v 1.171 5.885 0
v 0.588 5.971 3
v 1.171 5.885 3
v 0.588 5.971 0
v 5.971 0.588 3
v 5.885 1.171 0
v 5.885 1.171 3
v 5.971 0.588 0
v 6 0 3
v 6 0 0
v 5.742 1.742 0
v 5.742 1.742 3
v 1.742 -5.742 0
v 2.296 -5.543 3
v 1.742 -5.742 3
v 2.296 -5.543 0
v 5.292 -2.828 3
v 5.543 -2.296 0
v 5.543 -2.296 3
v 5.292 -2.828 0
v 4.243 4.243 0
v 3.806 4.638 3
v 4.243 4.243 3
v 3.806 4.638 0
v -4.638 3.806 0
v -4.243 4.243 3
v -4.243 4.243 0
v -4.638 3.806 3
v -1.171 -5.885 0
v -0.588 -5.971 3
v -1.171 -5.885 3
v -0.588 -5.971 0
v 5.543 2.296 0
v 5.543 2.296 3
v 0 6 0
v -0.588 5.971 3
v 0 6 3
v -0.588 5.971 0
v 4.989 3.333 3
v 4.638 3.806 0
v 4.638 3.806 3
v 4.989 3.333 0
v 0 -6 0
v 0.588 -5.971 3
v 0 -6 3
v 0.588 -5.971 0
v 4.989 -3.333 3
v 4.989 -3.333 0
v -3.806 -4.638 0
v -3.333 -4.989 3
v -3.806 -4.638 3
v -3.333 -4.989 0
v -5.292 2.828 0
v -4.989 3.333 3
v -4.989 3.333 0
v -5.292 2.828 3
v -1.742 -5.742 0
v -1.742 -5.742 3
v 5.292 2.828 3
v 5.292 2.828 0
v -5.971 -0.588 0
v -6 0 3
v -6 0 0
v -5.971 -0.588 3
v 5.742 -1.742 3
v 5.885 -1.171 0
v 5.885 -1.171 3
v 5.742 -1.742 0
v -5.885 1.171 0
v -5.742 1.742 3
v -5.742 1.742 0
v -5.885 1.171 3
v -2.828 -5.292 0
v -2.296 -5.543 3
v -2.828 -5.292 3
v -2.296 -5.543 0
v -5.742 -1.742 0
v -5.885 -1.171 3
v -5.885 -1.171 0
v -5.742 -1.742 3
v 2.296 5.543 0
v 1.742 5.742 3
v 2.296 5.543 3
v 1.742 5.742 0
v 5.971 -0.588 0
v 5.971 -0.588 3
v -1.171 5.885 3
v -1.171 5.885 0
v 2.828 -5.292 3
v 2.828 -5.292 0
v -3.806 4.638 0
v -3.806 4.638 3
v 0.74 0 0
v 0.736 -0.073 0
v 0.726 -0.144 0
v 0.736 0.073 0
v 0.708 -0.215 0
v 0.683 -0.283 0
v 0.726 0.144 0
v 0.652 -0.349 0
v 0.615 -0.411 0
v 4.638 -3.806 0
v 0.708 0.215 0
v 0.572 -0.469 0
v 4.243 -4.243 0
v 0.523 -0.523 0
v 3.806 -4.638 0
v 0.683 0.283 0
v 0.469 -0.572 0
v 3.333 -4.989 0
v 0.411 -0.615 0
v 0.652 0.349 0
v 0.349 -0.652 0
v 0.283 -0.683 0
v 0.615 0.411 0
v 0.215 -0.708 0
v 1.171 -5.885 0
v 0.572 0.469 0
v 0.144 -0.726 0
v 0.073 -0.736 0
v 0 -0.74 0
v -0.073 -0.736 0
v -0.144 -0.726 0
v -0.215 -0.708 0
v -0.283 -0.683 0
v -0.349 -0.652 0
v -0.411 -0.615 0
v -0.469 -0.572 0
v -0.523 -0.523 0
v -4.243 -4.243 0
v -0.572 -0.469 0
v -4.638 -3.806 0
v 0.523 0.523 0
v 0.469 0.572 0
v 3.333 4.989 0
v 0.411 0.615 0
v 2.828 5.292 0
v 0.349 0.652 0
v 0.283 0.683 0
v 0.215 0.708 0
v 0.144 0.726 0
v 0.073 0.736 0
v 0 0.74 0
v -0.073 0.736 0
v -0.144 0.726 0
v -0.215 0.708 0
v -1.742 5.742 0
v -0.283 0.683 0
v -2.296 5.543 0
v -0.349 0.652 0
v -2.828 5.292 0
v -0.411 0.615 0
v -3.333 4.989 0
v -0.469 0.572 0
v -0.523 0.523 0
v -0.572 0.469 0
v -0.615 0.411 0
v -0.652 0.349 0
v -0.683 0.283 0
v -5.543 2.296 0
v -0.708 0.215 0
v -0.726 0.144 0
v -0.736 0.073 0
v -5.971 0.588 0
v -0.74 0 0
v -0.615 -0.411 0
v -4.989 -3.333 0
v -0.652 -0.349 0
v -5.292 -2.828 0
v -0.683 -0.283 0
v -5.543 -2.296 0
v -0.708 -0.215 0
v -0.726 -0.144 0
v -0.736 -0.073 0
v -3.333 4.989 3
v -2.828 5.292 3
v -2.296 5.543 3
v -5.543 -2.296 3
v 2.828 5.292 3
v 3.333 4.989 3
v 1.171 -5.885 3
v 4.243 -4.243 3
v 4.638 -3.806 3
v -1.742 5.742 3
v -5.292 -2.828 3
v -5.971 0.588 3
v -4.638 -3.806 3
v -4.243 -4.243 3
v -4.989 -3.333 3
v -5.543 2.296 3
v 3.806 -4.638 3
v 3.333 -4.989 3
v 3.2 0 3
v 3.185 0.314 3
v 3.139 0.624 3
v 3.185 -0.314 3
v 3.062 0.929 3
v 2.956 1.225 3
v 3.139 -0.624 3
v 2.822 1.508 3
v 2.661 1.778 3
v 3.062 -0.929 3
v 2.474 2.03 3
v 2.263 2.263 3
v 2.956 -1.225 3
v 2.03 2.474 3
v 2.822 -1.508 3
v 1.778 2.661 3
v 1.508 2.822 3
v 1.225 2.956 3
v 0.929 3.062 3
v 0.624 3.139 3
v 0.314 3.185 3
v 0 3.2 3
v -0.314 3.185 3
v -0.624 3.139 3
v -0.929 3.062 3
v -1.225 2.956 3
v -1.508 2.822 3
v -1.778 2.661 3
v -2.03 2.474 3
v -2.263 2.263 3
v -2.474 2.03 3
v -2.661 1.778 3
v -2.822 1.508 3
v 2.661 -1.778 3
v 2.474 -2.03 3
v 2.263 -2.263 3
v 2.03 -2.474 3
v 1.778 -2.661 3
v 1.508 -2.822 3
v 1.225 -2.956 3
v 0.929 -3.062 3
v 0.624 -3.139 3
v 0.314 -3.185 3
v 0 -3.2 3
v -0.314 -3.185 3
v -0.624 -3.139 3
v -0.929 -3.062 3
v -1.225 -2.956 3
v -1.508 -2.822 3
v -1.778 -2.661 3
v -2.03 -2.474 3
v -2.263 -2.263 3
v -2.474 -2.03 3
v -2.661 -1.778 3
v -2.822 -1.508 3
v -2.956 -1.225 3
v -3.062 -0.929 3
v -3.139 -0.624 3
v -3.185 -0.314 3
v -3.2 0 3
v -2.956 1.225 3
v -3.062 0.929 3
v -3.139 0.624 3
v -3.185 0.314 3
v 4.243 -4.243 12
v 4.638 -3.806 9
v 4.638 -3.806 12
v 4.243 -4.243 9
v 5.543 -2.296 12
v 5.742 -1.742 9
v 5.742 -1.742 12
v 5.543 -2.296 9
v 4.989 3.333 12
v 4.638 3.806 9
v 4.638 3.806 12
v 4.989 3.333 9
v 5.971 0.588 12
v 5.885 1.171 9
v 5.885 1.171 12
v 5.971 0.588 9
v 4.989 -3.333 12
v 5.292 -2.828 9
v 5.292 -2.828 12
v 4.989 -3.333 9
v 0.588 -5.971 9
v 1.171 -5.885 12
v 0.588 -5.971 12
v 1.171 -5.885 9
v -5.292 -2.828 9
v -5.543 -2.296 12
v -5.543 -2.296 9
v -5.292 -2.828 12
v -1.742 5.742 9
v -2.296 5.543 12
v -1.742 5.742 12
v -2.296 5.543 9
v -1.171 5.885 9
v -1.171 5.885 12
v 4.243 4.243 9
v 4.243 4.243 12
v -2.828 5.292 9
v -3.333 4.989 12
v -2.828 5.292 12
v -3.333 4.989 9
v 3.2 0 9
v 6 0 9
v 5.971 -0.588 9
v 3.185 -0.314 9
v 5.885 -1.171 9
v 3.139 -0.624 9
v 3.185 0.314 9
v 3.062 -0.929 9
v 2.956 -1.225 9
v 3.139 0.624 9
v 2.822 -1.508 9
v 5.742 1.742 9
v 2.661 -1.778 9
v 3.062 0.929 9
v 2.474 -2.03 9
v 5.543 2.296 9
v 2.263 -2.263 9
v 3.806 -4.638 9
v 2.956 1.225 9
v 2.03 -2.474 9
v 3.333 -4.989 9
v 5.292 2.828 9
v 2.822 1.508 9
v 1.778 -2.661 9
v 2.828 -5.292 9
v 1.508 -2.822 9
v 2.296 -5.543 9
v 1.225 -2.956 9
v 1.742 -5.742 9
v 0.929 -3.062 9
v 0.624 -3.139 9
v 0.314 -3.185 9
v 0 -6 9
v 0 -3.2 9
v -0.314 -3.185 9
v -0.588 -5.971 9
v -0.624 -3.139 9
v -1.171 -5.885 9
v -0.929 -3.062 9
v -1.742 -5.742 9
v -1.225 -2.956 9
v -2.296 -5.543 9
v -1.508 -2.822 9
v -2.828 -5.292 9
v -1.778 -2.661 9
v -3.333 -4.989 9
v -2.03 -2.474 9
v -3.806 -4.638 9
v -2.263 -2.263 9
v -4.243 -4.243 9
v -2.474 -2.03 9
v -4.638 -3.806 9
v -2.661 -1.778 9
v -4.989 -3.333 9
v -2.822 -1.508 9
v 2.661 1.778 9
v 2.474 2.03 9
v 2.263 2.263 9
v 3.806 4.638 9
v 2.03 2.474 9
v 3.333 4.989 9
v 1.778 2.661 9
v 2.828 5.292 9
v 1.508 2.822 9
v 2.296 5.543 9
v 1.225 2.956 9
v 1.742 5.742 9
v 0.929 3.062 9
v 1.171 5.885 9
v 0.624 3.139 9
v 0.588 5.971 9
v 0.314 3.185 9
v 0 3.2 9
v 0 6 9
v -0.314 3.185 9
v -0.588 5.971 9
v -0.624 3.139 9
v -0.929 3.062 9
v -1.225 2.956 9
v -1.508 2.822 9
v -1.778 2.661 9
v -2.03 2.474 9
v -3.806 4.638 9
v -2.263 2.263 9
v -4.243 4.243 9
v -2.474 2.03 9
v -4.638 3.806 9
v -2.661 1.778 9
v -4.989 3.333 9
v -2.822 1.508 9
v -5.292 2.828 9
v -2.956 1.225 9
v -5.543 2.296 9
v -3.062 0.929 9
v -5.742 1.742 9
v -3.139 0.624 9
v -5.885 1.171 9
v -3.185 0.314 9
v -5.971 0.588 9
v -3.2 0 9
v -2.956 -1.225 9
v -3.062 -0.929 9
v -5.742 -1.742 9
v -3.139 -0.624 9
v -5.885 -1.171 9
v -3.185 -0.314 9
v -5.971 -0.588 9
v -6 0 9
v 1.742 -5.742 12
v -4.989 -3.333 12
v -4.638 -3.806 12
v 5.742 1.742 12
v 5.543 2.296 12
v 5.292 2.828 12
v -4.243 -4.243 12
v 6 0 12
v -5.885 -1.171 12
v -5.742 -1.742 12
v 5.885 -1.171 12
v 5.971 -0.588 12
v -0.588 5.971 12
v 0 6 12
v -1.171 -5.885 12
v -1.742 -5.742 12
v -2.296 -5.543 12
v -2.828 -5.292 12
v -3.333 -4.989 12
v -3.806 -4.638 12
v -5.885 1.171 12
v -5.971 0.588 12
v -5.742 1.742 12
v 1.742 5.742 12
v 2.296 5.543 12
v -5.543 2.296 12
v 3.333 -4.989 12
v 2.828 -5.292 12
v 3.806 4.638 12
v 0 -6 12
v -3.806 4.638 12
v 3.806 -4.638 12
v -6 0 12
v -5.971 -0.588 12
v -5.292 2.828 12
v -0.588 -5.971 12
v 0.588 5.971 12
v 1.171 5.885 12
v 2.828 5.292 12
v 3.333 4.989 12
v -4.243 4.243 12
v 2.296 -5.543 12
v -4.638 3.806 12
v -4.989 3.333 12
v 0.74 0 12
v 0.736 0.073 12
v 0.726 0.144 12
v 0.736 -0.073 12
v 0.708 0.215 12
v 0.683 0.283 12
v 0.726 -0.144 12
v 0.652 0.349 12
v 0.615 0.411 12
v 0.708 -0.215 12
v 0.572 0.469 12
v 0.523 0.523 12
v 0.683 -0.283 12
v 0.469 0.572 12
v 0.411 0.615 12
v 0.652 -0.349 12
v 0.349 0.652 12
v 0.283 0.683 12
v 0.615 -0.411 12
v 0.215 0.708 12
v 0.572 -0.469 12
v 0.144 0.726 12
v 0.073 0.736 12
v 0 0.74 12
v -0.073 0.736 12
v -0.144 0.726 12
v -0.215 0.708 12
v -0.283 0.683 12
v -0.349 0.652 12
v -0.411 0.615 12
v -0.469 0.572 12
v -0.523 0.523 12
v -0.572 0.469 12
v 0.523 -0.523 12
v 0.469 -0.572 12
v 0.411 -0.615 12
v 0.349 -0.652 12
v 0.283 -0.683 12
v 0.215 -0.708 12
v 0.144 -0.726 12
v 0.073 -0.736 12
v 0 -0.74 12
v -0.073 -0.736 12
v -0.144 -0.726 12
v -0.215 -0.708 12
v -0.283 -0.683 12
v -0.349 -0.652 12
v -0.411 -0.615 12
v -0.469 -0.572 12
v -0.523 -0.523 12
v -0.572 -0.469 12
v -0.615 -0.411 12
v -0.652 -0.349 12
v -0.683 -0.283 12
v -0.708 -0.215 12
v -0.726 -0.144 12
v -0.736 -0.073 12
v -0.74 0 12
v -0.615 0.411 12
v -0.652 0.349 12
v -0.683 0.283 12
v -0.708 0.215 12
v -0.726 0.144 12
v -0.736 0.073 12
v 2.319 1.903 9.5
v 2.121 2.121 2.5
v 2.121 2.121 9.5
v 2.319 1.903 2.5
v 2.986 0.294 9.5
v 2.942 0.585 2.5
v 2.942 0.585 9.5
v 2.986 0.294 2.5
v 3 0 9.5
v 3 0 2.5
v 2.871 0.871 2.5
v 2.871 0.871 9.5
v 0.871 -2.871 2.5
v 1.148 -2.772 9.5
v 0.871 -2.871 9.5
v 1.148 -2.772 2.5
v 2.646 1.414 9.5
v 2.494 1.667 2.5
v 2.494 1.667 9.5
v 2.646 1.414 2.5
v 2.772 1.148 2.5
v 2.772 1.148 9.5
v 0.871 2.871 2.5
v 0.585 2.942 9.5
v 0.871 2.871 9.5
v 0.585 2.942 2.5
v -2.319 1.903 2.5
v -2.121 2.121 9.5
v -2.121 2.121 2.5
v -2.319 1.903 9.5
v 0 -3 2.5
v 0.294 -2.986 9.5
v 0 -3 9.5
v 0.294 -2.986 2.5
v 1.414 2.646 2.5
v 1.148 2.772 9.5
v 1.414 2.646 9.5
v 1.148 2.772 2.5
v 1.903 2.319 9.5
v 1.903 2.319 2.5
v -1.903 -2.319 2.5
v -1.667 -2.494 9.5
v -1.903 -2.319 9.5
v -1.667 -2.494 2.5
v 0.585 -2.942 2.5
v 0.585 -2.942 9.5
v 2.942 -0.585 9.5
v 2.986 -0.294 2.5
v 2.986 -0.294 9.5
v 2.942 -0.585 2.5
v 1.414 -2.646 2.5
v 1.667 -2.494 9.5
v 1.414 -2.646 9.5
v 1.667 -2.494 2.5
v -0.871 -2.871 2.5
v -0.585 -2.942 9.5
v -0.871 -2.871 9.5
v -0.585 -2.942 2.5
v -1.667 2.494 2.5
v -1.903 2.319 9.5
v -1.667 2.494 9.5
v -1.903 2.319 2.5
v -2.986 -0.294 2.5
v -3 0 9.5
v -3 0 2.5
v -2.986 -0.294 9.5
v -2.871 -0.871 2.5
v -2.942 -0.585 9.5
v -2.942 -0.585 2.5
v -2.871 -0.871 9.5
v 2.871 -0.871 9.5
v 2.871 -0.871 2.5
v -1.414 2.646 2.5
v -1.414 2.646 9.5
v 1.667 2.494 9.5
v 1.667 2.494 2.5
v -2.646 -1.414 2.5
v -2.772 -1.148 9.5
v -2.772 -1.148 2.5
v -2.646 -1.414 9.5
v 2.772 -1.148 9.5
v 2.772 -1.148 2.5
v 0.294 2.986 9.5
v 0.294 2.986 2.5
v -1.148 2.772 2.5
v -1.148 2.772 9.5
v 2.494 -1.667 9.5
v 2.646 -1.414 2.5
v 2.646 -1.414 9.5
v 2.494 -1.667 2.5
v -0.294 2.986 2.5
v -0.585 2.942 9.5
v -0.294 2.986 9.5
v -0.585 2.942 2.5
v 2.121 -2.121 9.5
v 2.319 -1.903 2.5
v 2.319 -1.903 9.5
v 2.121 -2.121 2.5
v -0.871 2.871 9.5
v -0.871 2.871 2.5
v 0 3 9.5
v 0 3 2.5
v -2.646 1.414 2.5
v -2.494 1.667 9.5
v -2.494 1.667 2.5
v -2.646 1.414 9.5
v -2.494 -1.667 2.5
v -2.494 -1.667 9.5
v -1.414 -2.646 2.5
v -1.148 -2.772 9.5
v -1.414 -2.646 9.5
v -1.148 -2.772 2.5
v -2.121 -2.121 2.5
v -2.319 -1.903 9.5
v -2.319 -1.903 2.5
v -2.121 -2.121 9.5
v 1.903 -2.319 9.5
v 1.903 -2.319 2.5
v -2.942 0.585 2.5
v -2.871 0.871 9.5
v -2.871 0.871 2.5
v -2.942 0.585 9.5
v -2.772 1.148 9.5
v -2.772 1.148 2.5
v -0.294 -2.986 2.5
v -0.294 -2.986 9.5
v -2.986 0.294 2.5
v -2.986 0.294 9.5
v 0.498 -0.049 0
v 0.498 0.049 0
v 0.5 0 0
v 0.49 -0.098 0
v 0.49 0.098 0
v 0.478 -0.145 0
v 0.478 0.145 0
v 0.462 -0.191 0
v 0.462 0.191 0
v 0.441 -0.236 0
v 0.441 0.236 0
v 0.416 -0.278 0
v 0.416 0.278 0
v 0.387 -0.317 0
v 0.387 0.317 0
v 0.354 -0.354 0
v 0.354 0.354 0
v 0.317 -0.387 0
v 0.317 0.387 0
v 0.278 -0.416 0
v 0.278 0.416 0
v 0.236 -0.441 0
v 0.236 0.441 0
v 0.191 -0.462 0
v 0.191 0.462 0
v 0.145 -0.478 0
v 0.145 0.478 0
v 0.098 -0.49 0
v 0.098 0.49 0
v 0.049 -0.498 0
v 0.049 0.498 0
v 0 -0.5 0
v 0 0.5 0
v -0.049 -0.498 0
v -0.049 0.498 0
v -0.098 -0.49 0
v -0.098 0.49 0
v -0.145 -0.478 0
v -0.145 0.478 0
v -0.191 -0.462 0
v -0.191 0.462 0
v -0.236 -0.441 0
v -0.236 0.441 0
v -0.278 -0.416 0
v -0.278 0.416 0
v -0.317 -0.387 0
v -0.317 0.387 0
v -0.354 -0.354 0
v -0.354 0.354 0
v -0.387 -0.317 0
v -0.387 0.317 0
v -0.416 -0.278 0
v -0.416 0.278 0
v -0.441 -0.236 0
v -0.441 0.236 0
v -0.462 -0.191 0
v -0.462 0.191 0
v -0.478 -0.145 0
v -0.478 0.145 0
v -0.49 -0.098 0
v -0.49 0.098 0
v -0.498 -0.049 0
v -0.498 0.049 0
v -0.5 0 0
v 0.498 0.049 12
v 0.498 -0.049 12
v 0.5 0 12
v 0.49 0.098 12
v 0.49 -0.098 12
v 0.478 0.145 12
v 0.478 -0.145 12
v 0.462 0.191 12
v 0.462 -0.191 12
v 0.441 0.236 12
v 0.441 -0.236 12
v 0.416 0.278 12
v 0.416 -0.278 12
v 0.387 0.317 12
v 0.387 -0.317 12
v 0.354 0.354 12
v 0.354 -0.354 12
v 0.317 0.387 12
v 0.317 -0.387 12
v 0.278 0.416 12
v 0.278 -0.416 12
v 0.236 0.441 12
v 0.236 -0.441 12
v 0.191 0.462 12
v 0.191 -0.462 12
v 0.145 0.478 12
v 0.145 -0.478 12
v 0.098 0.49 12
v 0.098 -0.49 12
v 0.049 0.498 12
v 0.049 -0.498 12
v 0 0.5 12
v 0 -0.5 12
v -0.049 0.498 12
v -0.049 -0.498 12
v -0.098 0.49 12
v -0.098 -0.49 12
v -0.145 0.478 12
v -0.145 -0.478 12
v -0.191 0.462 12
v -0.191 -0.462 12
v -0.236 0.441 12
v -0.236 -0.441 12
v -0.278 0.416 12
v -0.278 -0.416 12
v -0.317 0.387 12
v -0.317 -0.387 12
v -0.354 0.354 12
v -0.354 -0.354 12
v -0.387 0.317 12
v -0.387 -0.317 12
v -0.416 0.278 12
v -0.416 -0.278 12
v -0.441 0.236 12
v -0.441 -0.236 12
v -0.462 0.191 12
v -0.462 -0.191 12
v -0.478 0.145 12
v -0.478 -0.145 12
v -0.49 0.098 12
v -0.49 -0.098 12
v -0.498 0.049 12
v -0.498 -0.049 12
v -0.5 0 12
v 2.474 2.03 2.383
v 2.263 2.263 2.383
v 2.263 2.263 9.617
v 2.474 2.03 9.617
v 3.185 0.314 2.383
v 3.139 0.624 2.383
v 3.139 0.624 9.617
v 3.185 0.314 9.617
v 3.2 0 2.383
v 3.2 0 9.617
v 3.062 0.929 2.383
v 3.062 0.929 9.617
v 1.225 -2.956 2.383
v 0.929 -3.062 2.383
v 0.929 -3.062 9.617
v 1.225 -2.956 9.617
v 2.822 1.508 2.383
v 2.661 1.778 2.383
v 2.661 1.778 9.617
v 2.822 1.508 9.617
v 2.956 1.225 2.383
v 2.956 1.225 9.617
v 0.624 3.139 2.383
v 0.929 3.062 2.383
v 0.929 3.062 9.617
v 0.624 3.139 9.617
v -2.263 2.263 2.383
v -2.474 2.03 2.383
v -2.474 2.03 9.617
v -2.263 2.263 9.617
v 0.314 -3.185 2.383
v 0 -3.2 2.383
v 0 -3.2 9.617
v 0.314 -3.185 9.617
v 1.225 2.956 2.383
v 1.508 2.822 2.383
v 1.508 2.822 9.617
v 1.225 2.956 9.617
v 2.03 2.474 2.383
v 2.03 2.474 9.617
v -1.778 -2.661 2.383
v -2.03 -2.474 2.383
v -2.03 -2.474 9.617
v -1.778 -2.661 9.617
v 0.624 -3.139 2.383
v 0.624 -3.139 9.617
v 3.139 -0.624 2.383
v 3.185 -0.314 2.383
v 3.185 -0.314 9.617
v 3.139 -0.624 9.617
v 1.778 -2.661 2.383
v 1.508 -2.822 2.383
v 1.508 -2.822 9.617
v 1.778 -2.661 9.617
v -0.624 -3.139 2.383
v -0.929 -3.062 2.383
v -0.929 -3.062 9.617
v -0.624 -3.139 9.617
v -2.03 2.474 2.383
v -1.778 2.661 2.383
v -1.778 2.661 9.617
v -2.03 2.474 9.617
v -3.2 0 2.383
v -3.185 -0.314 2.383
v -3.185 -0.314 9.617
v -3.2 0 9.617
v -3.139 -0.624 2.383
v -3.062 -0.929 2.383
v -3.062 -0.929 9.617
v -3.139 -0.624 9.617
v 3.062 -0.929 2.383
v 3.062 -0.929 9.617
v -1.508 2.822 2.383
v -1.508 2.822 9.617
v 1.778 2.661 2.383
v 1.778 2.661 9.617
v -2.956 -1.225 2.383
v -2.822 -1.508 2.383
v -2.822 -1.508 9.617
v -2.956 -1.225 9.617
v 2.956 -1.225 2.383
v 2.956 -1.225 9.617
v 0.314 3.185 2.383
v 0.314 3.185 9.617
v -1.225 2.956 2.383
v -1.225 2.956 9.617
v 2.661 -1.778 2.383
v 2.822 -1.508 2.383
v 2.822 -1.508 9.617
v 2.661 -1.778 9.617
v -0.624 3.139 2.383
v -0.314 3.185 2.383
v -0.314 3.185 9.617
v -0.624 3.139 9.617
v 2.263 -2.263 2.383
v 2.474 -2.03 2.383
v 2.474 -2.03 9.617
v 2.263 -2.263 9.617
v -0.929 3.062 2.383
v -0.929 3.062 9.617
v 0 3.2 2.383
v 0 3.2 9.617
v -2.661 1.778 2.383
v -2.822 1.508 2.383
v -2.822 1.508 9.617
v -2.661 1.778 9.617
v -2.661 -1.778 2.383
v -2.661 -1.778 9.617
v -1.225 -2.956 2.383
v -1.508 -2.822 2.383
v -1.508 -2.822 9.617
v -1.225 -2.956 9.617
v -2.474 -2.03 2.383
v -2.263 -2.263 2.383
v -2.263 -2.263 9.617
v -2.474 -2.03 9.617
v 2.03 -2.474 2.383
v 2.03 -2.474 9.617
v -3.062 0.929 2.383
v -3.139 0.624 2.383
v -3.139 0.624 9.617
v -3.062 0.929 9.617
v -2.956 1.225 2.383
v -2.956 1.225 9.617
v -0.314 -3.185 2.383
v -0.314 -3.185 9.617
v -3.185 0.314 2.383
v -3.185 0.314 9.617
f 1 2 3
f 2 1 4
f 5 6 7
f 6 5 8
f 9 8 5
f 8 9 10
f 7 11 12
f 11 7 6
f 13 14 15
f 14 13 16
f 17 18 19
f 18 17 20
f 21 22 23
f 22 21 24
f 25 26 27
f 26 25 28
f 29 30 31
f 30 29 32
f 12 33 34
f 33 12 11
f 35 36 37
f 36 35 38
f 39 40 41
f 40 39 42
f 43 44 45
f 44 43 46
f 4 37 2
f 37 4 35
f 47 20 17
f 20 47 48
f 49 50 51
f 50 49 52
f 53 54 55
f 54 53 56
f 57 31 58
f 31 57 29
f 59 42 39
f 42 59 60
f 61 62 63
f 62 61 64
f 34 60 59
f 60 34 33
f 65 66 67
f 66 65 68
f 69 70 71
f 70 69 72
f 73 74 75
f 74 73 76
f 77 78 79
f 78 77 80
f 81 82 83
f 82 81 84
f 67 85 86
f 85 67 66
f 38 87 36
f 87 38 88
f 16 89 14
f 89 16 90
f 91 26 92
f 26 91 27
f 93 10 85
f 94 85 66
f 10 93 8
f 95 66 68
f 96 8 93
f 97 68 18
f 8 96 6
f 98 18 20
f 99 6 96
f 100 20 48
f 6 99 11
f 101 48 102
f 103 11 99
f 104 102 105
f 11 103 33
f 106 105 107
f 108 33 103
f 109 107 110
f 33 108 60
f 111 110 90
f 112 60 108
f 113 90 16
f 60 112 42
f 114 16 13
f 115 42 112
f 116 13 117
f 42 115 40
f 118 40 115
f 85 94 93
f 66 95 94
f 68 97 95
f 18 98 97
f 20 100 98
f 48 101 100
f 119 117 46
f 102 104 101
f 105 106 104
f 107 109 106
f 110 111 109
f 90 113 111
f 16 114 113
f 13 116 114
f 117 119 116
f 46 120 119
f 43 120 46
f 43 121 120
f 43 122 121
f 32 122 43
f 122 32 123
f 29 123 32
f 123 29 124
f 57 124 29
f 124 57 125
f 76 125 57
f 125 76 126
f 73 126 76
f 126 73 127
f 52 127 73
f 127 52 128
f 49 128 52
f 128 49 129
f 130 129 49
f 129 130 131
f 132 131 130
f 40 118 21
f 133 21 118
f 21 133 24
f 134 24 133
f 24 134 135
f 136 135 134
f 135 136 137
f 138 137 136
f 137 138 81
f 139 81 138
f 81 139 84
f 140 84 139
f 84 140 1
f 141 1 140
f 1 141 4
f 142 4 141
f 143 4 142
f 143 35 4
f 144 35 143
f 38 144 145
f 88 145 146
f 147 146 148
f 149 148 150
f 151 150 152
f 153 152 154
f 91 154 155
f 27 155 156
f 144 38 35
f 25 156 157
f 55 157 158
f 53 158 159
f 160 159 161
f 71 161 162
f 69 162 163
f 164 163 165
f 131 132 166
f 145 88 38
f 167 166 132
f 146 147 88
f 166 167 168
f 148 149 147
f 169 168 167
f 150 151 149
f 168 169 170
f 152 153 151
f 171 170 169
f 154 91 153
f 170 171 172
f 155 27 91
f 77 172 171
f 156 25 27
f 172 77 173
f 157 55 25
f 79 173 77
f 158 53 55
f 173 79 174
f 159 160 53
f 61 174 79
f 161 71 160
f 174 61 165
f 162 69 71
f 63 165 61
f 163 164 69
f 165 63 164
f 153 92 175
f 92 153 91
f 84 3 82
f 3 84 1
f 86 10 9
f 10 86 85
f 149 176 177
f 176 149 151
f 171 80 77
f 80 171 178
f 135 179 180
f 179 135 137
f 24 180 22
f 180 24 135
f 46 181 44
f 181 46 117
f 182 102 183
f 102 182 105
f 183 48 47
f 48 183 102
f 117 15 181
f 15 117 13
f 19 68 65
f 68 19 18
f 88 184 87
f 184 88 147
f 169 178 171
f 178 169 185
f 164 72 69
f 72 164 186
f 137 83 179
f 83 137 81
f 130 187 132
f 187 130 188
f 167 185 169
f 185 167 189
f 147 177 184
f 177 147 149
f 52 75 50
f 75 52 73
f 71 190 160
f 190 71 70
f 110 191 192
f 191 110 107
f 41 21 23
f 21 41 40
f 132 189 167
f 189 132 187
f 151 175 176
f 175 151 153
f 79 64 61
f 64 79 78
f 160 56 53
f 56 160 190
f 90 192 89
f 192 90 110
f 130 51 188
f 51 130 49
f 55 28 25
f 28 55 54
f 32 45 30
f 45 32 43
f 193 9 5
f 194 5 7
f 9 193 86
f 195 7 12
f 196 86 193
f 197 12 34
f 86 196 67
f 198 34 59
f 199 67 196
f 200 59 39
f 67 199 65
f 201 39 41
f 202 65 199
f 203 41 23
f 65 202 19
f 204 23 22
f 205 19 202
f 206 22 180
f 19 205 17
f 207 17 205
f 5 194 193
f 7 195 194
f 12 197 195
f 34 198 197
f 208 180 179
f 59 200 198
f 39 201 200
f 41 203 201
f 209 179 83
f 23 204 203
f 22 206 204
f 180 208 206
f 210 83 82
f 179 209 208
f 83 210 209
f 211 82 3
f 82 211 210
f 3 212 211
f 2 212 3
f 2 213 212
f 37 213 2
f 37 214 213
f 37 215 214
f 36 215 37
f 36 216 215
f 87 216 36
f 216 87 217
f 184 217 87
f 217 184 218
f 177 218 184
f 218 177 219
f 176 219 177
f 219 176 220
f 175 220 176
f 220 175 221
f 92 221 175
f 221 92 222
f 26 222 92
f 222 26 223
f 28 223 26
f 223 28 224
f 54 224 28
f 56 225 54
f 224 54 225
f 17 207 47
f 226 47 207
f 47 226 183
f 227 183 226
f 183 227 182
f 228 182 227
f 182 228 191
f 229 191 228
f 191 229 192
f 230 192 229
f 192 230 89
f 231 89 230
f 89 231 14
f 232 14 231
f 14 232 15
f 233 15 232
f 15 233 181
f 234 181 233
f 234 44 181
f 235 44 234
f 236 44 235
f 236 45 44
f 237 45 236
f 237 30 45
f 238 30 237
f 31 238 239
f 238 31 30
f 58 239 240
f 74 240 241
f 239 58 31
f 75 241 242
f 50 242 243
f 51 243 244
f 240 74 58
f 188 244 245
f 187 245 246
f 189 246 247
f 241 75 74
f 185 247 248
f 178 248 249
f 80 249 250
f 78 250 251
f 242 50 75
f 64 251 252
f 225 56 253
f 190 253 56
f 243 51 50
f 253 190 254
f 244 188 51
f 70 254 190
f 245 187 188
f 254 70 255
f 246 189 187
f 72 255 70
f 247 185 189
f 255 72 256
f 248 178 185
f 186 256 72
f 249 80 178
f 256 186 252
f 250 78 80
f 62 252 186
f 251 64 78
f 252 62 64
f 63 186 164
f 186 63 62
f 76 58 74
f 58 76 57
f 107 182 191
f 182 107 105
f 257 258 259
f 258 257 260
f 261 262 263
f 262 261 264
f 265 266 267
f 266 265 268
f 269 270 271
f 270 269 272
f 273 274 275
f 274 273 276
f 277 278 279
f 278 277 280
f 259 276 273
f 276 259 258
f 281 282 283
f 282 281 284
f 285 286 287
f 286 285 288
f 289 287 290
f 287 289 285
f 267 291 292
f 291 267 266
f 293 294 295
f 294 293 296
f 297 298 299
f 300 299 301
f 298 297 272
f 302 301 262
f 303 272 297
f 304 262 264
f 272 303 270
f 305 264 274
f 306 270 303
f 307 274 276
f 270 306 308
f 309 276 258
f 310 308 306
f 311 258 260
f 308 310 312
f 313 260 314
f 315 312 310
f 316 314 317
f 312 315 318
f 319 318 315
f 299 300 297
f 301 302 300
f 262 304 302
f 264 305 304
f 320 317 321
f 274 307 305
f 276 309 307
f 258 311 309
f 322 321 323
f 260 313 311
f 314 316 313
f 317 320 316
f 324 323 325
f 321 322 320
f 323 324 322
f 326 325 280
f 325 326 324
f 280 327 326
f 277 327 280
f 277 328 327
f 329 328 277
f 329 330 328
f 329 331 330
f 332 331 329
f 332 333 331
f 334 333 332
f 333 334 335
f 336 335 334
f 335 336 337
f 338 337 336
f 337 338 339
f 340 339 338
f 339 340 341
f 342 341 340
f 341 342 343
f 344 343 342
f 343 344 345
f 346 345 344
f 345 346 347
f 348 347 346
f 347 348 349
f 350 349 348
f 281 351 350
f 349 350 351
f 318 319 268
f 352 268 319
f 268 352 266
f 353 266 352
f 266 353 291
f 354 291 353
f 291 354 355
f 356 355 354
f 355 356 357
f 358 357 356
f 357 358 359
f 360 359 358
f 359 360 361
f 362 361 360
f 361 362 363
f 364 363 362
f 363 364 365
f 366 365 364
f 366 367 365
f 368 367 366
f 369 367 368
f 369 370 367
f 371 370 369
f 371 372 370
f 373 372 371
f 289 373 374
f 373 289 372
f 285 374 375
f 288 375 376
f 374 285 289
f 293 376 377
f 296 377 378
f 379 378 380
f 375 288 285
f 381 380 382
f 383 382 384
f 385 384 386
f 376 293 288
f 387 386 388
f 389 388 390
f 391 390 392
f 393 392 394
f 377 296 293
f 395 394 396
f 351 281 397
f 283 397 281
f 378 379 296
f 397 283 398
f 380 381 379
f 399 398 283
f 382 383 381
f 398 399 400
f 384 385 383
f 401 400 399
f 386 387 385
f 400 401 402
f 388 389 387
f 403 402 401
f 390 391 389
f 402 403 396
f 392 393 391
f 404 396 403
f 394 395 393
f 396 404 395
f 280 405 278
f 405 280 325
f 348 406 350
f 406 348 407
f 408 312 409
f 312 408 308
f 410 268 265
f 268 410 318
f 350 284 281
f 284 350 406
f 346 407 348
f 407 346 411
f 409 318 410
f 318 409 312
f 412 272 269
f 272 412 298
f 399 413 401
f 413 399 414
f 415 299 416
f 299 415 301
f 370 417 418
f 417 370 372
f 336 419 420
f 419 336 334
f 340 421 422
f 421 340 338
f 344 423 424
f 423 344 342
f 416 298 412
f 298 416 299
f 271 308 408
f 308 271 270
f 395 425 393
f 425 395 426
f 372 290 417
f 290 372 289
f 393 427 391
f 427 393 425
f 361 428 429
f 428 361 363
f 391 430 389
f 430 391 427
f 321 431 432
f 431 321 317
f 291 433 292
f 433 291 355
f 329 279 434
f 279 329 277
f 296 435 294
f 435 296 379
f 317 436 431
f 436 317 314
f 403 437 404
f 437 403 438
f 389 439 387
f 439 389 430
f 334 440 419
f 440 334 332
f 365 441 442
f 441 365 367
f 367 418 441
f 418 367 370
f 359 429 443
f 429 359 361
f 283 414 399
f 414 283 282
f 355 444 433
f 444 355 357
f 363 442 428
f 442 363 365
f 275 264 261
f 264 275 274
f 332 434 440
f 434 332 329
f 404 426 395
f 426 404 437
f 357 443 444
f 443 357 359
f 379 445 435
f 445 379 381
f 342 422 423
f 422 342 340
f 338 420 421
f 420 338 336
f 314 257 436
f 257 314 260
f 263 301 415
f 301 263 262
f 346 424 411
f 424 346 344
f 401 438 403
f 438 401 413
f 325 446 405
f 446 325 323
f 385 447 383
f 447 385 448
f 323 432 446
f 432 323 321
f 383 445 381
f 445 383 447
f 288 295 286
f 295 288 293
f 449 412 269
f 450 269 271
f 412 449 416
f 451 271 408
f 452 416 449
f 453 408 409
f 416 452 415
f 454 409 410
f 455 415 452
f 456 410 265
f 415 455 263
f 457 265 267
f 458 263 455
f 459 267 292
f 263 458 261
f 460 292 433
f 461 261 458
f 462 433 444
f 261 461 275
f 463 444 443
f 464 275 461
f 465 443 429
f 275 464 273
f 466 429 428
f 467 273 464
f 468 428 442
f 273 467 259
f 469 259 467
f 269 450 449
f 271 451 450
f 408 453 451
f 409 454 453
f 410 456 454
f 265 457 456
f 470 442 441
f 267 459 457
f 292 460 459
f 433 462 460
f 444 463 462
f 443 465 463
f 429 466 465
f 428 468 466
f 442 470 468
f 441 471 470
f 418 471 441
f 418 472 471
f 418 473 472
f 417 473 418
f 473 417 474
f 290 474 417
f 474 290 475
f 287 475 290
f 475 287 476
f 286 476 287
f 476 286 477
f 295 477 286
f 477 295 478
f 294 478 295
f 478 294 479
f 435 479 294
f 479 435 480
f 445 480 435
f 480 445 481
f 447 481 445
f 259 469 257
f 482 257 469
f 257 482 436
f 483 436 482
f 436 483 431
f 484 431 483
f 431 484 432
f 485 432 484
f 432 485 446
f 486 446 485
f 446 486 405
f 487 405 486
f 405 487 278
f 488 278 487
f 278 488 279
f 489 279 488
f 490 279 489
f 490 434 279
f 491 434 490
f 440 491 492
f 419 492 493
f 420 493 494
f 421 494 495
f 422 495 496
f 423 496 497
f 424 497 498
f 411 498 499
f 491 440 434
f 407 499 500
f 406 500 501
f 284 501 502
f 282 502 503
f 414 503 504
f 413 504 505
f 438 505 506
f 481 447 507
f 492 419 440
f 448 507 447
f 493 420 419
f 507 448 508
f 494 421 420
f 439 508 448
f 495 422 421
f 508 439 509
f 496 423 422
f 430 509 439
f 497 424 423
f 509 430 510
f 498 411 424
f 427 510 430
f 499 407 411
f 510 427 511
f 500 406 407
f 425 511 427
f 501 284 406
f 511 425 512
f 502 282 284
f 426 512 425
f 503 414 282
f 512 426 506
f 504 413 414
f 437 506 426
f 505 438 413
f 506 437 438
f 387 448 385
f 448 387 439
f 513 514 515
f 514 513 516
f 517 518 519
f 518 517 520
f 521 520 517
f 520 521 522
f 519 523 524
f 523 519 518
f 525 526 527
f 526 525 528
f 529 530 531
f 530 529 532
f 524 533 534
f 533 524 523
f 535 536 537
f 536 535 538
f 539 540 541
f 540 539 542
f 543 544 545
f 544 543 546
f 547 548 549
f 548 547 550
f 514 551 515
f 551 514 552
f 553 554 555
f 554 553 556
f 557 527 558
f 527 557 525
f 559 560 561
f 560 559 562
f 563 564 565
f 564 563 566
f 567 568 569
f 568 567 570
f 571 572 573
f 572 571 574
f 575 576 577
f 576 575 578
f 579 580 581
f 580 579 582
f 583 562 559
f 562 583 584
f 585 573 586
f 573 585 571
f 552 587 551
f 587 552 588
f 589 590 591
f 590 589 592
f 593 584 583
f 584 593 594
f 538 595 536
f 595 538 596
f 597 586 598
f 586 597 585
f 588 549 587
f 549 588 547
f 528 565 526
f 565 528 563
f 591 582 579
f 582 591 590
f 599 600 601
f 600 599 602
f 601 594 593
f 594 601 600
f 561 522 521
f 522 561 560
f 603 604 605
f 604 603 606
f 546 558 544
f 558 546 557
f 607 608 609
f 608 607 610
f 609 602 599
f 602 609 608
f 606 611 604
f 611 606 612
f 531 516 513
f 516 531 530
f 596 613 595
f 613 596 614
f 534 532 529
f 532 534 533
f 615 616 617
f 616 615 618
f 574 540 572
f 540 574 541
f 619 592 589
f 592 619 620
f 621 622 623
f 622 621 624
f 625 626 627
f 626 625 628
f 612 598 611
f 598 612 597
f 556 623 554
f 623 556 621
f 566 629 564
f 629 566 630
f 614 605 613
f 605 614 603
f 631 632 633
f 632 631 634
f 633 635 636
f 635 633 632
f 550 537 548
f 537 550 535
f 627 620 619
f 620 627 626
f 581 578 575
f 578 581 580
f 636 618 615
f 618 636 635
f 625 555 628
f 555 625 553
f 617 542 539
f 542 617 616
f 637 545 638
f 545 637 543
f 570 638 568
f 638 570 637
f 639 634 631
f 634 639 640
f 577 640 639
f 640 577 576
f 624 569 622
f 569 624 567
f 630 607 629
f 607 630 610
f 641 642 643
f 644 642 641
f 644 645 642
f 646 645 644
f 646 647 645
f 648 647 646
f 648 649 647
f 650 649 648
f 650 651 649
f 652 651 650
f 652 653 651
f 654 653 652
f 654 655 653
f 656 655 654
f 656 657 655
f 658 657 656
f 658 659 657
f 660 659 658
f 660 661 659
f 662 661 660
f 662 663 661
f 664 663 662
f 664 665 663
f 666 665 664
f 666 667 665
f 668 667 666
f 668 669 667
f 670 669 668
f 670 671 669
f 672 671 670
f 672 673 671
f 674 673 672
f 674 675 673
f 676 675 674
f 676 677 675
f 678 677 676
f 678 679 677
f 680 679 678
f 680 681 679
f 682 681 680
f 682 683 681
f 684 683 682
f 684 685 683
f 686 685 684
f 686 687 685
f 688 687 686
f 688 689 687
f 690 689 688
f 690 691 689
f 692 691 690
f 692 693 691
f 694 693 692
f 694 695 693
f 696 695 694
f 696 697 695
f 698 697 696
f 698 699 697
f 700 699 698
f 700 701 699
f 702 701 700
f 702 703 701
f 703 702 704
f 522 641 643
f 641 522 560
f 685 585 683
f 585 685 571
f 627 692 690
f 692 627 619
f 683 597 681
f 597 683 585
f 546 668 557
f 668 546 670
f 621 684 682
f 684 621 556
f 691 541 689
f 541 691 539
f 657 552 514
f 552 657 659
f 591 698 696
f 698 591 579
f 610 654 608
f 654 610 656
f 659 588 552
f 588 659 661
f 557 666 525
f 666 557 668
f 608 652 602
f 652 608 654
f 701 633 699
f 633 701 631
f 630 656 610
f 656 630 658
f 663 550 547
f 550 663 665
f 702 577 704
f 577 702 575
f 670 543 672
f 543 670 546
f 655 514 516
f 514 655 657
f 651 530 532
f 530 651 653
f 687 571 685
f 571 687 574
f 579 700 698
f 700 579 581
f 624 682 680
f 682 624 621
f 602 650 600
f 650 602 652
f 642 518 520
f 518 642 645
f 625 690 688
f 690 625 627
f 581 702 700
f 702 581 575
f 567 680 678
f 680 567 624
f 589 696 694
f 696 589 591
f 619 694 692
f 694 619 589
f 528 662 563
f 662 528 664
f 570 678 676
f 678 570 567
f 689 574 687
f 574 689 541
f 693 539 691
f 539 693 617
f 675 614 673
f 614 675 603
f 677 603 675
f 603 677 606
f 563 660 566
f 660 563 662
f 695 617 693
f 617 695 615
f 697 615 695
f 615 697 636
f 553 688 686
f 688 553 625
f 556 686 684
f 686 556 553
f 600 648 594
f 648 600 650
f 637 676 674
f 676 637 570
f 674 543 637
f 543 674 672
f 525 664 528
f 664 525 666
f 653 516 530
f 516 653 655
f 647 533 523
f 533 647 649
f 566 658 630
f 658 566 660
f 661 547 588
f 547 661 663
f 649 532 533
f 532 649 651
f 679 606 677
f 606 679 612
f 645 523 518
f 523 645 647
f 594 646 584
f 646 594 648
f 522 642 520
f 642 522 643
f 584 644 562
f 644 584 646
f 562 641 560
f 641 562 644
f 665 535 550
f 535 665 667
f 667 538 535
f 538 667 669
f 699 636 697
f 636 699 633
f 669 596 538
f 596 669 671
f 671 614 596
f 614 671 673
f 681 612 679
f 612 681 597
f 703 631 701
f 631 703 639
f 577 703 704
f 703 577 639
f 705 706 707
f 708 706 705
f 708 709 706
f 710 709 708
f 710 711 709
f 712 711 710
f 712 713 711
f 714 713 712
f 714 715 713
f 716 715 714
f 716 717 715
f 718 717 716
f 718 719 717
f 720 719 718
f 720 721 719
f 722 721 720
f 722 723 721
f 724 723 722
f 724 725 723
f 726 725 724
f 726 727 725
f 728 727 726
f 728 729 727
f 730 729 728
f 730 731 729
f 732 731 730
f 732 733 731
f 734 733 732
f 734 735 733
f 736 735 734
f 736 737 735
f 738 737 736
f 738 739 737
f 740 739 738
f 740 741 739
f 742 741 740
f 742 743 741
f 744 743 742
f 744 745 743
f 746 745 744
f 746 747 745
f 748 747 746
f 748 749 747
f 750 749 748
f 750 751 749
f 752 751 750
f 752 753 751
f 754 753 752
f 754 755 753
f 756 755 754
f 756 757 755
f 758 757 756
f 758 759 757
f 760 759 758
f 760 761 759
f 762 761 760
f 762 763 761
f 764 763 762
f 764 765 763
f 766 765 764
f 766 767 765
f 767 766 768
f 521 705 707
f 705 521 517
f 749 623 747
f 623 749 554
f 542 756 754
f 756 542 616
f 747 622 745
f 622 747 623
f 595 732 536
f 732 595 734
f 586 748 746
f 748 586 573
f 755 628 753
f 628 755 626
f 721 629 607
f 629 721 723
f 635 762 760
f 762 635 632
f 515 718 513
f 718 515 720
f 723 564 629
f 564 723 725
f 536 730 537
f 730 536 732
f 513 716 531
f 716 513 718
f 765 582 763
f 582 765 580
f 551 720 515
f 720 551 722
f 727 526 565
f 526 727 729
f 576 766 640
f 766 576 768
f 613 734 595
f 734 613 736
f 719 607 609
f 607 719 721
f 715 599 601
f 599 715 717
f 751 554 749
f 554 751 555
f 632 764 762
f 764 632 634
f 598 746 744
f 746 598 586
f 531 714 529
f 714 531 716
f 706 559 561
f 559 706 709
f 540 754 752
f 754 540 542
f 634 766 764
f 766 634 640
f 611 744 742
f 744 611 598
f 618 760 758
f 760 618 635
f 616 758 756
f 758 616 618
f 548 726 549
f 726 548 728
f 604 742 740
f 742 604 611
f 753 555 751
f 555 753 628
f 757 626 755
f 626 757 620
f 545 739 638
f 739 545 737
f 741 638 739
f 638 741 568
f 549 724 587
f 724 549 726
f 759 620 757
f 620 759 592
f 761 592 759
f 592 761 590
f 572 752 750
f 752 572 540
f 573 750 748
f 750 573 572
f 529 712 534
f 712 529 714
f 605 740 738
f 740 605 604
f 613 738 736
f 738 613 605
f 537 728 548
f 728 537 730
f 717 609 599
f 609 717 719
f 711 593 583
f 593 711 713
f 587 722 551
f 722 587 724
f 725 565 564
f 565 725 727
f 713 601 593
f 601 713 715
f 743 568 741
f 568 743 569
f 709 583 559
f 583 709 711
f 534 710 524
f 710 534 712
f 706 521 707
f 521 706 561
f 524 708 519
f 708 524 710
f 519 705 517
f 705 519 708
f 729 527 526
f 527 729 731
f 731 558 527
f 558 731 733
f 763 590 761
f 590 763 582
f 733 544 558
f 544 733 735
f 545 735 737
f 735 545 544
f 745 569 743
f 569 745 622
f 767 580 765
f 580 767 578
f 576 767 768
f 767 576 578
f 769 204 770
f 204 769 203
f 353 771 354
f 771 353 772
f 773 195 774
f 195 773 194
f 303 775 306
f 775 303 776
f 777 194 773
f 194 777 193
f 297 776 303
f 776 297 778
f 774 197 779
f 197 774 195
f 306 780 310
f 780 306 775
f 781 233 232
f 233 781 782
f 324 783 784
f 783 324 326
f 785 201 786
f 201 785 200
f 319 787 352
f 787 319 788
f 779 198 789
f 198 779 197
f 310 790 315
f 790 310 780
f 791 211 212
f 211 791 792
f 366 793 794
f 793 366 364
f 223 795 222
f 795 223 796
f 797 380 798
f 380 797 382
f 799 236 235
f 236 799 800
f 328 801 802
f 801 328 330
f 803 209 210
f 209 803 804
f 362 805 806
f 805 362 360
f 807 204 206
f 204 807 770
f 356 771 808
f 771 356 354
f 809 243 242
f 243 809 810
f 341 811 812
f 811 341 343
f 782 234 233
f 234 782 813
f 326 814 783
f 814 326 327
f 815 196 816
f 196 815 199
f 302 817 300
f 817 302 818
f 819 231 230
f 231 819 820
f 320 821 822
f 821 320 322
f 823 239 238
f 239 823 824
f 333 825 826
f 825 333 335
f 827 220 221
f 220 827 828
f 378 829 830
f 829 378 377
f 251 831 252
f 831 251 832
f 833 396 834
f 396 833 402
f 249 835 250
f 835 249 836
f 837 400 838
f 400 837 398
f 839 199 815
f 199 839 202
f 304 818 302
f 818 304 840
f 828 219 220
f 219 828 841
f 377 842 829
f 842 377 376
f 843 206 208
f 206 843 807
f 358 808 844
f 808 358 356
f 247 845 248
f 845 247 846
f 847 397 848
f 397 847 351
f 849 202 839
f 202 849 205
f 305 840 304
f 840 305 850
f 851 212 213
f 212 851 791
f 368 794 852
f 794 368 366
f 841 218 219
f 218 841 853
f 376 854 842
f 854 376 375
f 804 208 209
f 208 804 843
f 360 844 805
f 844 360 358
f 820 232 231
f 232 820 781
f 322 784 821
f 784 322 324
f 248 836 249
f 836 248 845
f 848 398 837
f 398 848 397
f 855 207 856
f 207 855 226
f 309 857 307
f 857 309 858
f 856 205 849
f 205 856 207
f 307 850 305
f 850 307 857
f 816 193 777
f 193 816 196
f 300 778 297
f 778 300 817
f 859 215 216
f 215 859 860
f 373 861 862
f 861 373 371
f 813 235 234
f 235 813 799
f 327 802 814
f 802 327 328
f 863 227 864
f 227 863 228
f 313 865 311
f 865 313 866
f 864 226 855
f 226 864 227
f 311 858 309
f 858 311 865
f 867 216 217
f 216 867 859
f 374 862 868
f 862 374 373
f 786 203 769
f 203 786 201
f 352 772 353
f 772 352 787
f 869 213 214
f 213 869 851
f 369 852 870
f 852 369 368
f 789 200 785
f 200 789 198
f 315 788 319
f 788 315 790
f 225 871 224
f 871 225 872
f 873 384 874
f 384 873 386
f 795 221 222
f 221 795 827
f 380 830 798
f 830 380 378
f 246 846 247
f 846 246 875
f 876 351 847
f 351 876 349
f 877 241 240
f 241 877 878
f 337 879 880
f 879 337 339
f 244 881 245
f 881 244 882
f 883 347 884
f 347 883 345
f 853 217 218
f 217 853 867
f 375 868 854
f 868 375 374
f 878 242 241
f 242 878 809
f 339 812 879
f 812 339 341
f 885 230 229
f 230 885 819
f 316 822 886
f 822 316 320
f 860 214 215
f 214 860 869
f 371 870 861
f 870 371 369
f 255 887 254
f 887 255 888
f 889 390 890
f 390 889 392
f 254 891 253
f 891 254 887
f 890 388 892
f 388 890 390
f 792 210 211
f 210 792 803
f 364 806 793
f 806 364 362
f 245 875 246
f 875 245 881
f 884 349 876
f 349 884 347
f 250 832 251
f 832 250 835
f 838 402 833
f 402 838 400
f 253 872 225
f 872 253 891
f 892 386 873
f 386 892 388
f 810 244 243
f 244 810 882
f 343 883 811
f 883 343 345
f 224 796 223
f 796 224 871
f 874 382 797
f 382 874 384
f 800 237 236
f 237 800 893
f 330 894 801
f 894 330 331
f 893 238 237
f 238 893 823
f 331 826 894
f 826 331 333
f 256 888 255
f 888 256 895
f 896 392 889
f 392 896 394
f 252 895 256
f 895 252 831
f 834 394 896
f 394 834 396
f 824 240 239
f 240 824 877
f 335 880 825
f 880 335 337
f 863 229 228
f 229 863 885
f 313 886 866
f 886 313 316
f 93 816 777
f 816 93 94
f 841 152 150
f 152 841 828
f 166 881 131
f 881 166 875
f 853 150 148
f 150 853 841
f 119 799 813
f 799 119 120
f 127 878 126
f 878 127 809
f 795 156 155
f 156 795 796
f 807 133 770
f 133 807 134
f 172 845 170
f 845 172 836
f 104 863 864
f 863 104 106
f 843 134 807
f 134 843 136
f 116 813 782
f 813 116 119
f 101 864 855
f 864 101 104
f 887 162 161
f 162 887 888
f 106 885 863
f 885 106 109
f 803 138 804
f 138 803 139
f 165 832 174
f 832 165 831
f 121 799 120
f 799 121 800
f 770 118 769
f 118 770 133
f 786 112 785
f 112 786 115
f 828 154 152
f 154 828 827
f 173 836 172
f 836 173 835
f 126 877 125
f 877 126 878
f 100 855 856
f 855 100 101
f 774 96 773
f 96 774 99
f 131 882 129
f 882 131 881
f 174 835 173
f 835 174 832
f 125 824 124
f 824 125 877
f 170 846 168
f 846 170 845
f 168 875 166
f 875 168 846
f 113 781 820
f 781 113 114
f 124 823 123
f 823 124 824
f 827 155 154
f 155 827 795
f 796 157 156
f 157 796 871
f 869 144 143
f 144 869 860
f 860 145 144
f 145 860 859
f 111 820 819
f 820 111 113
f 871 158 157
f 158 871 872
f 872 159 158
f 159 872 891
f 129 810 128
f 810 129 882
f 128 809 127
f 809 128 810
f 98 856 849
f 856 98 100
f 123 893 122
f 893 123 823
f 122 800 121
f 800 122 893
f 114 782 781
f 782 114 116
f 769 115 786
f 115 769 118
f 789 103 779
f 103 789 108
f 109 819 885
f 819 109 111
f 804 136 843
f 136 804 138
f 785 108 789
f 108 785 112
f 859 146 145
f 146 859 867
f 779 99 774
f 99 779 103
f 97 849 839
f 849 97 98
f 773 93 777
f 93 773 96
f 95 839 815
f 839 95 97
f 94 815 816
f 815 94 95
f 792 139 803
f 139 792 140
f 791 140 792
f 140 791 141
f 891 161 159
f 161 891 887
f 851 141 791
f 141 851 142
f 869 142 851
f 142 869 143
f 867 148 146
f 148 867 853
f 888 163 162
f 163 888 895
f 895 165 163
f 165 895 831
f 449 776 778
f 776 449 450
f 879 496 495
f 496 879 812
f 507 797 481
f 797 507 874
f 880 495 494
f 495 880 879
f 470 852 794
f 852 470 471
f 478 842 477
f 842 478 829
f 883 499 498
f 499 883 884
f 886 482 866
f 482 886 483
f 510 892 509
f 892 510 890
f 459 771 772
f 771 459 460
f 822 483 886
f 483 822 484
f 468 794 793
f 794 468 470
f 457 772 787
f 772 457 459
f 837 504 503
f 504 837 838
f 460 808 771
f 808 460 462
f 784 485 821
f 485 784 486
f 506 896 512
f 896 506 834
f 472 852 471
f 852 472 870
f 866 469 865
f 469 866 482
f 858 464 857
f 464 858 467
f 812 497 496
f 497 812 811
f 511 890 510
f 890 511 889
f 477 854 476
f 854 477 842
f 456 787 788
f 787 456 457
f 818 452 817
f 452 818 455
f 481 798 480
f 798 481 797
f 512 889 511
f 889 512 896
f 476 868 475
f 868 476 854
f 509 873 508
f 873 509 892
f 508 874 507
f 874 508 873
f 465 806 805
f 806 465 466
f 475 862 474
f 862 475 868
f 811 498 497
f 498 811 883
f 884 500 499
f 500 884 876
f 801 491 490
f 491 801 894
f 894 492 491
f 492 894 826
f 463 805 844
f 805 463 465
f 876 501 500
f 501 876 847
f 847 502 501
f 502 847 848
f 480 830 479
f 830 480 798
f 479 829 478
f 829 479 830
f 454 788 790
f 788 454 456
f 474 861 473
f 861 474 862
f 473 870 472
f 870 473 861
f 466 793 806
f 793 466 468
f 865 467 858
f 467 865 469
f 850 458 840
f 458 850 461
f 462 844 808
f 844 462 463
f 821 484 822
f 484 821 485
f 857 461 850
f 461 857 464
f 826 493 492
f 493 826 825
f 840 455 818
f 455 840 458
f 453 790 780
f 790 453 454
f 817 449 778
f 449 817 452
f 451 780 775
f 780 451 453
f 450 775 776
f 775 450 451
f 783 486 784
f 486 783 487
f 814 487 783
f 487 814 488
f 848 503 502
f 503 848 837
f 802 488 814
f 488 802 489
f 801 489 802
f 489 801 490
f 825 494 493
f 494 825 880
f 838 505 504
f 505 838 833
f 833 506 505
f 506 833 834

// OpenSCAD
// file: truncated_cone.scad
$fn = 64;

chop_end = .5; // How much to chop off the end of the cones

//truncated_45_cone_two_ends(3);

module truncated_45_cone(radius) {
	// add a cylinder to compensate for chopped end to keep length equal to radius
	union() {
	cylinder(r=radius, h=chop_end); 
	translate([0,0,chop_end]) {
		intersection(){
			translate([-radius,-radius,0]) cube(size=[radius * 2,radius * 2 ,radius - .5]);
			cylinder(h=radius, r1=radius, r2=0);
		}
	}
	}
}

module truncated_45_cone_two_ends(radius) {
	union() {
		truncated_45_cone(radius);
		rotate([180,0,0]) truncated_45_cone(radius);
	}
}
// main file
$fn = 64;
include<truncated_cone.scad>;
//pin(3,12);
//receiver(6, 3, 12);
hinge(3, 12, 6, 3);
slop = .2;

%cube(12);
module pin(radius, length) {
	translate([0,0,0]) {
	union(){
	translate([0,0,radius]) cylinder(r=radius, h=length - 2 * radius);
	translate([0,0,radius]) pin_end(radius);
	translate([0,0,length - radius])
		pin_end(radius);
	}
	}
}

module pin_end(radius) {
	//sphere(r=radius);
	truncated_45_cone_two_ends(3);
}

module receiver(radius, thickness, pin_radius, pin_length) {

	union(){
	cylinder(r=radius, h=thickness);
	translate([0,0, pin_length - 3])
		cylinder(r=radius, h=thickness);
	}
	
}

module hinge(pin_radius, pin_length, hinge_radius, hinge_thickness){
	xy_scale = (pin_radius*2 + 2*slop) / (pin_radius * 2);
	z_scale = (pin_length + 2*slop) / pin_length;
	union(){
	difference(){
		receiver(hinge_radius, hinge_thickness, pin_radius, pin_length);
		
		translate([0,0,-slop]) {
			scale([xy_scale, xy_scale, z_scale]) {
				pin(pin_radius, pin_length);
			}
		}
	}
	pin(pin_radius, pin_length);
	}

}
